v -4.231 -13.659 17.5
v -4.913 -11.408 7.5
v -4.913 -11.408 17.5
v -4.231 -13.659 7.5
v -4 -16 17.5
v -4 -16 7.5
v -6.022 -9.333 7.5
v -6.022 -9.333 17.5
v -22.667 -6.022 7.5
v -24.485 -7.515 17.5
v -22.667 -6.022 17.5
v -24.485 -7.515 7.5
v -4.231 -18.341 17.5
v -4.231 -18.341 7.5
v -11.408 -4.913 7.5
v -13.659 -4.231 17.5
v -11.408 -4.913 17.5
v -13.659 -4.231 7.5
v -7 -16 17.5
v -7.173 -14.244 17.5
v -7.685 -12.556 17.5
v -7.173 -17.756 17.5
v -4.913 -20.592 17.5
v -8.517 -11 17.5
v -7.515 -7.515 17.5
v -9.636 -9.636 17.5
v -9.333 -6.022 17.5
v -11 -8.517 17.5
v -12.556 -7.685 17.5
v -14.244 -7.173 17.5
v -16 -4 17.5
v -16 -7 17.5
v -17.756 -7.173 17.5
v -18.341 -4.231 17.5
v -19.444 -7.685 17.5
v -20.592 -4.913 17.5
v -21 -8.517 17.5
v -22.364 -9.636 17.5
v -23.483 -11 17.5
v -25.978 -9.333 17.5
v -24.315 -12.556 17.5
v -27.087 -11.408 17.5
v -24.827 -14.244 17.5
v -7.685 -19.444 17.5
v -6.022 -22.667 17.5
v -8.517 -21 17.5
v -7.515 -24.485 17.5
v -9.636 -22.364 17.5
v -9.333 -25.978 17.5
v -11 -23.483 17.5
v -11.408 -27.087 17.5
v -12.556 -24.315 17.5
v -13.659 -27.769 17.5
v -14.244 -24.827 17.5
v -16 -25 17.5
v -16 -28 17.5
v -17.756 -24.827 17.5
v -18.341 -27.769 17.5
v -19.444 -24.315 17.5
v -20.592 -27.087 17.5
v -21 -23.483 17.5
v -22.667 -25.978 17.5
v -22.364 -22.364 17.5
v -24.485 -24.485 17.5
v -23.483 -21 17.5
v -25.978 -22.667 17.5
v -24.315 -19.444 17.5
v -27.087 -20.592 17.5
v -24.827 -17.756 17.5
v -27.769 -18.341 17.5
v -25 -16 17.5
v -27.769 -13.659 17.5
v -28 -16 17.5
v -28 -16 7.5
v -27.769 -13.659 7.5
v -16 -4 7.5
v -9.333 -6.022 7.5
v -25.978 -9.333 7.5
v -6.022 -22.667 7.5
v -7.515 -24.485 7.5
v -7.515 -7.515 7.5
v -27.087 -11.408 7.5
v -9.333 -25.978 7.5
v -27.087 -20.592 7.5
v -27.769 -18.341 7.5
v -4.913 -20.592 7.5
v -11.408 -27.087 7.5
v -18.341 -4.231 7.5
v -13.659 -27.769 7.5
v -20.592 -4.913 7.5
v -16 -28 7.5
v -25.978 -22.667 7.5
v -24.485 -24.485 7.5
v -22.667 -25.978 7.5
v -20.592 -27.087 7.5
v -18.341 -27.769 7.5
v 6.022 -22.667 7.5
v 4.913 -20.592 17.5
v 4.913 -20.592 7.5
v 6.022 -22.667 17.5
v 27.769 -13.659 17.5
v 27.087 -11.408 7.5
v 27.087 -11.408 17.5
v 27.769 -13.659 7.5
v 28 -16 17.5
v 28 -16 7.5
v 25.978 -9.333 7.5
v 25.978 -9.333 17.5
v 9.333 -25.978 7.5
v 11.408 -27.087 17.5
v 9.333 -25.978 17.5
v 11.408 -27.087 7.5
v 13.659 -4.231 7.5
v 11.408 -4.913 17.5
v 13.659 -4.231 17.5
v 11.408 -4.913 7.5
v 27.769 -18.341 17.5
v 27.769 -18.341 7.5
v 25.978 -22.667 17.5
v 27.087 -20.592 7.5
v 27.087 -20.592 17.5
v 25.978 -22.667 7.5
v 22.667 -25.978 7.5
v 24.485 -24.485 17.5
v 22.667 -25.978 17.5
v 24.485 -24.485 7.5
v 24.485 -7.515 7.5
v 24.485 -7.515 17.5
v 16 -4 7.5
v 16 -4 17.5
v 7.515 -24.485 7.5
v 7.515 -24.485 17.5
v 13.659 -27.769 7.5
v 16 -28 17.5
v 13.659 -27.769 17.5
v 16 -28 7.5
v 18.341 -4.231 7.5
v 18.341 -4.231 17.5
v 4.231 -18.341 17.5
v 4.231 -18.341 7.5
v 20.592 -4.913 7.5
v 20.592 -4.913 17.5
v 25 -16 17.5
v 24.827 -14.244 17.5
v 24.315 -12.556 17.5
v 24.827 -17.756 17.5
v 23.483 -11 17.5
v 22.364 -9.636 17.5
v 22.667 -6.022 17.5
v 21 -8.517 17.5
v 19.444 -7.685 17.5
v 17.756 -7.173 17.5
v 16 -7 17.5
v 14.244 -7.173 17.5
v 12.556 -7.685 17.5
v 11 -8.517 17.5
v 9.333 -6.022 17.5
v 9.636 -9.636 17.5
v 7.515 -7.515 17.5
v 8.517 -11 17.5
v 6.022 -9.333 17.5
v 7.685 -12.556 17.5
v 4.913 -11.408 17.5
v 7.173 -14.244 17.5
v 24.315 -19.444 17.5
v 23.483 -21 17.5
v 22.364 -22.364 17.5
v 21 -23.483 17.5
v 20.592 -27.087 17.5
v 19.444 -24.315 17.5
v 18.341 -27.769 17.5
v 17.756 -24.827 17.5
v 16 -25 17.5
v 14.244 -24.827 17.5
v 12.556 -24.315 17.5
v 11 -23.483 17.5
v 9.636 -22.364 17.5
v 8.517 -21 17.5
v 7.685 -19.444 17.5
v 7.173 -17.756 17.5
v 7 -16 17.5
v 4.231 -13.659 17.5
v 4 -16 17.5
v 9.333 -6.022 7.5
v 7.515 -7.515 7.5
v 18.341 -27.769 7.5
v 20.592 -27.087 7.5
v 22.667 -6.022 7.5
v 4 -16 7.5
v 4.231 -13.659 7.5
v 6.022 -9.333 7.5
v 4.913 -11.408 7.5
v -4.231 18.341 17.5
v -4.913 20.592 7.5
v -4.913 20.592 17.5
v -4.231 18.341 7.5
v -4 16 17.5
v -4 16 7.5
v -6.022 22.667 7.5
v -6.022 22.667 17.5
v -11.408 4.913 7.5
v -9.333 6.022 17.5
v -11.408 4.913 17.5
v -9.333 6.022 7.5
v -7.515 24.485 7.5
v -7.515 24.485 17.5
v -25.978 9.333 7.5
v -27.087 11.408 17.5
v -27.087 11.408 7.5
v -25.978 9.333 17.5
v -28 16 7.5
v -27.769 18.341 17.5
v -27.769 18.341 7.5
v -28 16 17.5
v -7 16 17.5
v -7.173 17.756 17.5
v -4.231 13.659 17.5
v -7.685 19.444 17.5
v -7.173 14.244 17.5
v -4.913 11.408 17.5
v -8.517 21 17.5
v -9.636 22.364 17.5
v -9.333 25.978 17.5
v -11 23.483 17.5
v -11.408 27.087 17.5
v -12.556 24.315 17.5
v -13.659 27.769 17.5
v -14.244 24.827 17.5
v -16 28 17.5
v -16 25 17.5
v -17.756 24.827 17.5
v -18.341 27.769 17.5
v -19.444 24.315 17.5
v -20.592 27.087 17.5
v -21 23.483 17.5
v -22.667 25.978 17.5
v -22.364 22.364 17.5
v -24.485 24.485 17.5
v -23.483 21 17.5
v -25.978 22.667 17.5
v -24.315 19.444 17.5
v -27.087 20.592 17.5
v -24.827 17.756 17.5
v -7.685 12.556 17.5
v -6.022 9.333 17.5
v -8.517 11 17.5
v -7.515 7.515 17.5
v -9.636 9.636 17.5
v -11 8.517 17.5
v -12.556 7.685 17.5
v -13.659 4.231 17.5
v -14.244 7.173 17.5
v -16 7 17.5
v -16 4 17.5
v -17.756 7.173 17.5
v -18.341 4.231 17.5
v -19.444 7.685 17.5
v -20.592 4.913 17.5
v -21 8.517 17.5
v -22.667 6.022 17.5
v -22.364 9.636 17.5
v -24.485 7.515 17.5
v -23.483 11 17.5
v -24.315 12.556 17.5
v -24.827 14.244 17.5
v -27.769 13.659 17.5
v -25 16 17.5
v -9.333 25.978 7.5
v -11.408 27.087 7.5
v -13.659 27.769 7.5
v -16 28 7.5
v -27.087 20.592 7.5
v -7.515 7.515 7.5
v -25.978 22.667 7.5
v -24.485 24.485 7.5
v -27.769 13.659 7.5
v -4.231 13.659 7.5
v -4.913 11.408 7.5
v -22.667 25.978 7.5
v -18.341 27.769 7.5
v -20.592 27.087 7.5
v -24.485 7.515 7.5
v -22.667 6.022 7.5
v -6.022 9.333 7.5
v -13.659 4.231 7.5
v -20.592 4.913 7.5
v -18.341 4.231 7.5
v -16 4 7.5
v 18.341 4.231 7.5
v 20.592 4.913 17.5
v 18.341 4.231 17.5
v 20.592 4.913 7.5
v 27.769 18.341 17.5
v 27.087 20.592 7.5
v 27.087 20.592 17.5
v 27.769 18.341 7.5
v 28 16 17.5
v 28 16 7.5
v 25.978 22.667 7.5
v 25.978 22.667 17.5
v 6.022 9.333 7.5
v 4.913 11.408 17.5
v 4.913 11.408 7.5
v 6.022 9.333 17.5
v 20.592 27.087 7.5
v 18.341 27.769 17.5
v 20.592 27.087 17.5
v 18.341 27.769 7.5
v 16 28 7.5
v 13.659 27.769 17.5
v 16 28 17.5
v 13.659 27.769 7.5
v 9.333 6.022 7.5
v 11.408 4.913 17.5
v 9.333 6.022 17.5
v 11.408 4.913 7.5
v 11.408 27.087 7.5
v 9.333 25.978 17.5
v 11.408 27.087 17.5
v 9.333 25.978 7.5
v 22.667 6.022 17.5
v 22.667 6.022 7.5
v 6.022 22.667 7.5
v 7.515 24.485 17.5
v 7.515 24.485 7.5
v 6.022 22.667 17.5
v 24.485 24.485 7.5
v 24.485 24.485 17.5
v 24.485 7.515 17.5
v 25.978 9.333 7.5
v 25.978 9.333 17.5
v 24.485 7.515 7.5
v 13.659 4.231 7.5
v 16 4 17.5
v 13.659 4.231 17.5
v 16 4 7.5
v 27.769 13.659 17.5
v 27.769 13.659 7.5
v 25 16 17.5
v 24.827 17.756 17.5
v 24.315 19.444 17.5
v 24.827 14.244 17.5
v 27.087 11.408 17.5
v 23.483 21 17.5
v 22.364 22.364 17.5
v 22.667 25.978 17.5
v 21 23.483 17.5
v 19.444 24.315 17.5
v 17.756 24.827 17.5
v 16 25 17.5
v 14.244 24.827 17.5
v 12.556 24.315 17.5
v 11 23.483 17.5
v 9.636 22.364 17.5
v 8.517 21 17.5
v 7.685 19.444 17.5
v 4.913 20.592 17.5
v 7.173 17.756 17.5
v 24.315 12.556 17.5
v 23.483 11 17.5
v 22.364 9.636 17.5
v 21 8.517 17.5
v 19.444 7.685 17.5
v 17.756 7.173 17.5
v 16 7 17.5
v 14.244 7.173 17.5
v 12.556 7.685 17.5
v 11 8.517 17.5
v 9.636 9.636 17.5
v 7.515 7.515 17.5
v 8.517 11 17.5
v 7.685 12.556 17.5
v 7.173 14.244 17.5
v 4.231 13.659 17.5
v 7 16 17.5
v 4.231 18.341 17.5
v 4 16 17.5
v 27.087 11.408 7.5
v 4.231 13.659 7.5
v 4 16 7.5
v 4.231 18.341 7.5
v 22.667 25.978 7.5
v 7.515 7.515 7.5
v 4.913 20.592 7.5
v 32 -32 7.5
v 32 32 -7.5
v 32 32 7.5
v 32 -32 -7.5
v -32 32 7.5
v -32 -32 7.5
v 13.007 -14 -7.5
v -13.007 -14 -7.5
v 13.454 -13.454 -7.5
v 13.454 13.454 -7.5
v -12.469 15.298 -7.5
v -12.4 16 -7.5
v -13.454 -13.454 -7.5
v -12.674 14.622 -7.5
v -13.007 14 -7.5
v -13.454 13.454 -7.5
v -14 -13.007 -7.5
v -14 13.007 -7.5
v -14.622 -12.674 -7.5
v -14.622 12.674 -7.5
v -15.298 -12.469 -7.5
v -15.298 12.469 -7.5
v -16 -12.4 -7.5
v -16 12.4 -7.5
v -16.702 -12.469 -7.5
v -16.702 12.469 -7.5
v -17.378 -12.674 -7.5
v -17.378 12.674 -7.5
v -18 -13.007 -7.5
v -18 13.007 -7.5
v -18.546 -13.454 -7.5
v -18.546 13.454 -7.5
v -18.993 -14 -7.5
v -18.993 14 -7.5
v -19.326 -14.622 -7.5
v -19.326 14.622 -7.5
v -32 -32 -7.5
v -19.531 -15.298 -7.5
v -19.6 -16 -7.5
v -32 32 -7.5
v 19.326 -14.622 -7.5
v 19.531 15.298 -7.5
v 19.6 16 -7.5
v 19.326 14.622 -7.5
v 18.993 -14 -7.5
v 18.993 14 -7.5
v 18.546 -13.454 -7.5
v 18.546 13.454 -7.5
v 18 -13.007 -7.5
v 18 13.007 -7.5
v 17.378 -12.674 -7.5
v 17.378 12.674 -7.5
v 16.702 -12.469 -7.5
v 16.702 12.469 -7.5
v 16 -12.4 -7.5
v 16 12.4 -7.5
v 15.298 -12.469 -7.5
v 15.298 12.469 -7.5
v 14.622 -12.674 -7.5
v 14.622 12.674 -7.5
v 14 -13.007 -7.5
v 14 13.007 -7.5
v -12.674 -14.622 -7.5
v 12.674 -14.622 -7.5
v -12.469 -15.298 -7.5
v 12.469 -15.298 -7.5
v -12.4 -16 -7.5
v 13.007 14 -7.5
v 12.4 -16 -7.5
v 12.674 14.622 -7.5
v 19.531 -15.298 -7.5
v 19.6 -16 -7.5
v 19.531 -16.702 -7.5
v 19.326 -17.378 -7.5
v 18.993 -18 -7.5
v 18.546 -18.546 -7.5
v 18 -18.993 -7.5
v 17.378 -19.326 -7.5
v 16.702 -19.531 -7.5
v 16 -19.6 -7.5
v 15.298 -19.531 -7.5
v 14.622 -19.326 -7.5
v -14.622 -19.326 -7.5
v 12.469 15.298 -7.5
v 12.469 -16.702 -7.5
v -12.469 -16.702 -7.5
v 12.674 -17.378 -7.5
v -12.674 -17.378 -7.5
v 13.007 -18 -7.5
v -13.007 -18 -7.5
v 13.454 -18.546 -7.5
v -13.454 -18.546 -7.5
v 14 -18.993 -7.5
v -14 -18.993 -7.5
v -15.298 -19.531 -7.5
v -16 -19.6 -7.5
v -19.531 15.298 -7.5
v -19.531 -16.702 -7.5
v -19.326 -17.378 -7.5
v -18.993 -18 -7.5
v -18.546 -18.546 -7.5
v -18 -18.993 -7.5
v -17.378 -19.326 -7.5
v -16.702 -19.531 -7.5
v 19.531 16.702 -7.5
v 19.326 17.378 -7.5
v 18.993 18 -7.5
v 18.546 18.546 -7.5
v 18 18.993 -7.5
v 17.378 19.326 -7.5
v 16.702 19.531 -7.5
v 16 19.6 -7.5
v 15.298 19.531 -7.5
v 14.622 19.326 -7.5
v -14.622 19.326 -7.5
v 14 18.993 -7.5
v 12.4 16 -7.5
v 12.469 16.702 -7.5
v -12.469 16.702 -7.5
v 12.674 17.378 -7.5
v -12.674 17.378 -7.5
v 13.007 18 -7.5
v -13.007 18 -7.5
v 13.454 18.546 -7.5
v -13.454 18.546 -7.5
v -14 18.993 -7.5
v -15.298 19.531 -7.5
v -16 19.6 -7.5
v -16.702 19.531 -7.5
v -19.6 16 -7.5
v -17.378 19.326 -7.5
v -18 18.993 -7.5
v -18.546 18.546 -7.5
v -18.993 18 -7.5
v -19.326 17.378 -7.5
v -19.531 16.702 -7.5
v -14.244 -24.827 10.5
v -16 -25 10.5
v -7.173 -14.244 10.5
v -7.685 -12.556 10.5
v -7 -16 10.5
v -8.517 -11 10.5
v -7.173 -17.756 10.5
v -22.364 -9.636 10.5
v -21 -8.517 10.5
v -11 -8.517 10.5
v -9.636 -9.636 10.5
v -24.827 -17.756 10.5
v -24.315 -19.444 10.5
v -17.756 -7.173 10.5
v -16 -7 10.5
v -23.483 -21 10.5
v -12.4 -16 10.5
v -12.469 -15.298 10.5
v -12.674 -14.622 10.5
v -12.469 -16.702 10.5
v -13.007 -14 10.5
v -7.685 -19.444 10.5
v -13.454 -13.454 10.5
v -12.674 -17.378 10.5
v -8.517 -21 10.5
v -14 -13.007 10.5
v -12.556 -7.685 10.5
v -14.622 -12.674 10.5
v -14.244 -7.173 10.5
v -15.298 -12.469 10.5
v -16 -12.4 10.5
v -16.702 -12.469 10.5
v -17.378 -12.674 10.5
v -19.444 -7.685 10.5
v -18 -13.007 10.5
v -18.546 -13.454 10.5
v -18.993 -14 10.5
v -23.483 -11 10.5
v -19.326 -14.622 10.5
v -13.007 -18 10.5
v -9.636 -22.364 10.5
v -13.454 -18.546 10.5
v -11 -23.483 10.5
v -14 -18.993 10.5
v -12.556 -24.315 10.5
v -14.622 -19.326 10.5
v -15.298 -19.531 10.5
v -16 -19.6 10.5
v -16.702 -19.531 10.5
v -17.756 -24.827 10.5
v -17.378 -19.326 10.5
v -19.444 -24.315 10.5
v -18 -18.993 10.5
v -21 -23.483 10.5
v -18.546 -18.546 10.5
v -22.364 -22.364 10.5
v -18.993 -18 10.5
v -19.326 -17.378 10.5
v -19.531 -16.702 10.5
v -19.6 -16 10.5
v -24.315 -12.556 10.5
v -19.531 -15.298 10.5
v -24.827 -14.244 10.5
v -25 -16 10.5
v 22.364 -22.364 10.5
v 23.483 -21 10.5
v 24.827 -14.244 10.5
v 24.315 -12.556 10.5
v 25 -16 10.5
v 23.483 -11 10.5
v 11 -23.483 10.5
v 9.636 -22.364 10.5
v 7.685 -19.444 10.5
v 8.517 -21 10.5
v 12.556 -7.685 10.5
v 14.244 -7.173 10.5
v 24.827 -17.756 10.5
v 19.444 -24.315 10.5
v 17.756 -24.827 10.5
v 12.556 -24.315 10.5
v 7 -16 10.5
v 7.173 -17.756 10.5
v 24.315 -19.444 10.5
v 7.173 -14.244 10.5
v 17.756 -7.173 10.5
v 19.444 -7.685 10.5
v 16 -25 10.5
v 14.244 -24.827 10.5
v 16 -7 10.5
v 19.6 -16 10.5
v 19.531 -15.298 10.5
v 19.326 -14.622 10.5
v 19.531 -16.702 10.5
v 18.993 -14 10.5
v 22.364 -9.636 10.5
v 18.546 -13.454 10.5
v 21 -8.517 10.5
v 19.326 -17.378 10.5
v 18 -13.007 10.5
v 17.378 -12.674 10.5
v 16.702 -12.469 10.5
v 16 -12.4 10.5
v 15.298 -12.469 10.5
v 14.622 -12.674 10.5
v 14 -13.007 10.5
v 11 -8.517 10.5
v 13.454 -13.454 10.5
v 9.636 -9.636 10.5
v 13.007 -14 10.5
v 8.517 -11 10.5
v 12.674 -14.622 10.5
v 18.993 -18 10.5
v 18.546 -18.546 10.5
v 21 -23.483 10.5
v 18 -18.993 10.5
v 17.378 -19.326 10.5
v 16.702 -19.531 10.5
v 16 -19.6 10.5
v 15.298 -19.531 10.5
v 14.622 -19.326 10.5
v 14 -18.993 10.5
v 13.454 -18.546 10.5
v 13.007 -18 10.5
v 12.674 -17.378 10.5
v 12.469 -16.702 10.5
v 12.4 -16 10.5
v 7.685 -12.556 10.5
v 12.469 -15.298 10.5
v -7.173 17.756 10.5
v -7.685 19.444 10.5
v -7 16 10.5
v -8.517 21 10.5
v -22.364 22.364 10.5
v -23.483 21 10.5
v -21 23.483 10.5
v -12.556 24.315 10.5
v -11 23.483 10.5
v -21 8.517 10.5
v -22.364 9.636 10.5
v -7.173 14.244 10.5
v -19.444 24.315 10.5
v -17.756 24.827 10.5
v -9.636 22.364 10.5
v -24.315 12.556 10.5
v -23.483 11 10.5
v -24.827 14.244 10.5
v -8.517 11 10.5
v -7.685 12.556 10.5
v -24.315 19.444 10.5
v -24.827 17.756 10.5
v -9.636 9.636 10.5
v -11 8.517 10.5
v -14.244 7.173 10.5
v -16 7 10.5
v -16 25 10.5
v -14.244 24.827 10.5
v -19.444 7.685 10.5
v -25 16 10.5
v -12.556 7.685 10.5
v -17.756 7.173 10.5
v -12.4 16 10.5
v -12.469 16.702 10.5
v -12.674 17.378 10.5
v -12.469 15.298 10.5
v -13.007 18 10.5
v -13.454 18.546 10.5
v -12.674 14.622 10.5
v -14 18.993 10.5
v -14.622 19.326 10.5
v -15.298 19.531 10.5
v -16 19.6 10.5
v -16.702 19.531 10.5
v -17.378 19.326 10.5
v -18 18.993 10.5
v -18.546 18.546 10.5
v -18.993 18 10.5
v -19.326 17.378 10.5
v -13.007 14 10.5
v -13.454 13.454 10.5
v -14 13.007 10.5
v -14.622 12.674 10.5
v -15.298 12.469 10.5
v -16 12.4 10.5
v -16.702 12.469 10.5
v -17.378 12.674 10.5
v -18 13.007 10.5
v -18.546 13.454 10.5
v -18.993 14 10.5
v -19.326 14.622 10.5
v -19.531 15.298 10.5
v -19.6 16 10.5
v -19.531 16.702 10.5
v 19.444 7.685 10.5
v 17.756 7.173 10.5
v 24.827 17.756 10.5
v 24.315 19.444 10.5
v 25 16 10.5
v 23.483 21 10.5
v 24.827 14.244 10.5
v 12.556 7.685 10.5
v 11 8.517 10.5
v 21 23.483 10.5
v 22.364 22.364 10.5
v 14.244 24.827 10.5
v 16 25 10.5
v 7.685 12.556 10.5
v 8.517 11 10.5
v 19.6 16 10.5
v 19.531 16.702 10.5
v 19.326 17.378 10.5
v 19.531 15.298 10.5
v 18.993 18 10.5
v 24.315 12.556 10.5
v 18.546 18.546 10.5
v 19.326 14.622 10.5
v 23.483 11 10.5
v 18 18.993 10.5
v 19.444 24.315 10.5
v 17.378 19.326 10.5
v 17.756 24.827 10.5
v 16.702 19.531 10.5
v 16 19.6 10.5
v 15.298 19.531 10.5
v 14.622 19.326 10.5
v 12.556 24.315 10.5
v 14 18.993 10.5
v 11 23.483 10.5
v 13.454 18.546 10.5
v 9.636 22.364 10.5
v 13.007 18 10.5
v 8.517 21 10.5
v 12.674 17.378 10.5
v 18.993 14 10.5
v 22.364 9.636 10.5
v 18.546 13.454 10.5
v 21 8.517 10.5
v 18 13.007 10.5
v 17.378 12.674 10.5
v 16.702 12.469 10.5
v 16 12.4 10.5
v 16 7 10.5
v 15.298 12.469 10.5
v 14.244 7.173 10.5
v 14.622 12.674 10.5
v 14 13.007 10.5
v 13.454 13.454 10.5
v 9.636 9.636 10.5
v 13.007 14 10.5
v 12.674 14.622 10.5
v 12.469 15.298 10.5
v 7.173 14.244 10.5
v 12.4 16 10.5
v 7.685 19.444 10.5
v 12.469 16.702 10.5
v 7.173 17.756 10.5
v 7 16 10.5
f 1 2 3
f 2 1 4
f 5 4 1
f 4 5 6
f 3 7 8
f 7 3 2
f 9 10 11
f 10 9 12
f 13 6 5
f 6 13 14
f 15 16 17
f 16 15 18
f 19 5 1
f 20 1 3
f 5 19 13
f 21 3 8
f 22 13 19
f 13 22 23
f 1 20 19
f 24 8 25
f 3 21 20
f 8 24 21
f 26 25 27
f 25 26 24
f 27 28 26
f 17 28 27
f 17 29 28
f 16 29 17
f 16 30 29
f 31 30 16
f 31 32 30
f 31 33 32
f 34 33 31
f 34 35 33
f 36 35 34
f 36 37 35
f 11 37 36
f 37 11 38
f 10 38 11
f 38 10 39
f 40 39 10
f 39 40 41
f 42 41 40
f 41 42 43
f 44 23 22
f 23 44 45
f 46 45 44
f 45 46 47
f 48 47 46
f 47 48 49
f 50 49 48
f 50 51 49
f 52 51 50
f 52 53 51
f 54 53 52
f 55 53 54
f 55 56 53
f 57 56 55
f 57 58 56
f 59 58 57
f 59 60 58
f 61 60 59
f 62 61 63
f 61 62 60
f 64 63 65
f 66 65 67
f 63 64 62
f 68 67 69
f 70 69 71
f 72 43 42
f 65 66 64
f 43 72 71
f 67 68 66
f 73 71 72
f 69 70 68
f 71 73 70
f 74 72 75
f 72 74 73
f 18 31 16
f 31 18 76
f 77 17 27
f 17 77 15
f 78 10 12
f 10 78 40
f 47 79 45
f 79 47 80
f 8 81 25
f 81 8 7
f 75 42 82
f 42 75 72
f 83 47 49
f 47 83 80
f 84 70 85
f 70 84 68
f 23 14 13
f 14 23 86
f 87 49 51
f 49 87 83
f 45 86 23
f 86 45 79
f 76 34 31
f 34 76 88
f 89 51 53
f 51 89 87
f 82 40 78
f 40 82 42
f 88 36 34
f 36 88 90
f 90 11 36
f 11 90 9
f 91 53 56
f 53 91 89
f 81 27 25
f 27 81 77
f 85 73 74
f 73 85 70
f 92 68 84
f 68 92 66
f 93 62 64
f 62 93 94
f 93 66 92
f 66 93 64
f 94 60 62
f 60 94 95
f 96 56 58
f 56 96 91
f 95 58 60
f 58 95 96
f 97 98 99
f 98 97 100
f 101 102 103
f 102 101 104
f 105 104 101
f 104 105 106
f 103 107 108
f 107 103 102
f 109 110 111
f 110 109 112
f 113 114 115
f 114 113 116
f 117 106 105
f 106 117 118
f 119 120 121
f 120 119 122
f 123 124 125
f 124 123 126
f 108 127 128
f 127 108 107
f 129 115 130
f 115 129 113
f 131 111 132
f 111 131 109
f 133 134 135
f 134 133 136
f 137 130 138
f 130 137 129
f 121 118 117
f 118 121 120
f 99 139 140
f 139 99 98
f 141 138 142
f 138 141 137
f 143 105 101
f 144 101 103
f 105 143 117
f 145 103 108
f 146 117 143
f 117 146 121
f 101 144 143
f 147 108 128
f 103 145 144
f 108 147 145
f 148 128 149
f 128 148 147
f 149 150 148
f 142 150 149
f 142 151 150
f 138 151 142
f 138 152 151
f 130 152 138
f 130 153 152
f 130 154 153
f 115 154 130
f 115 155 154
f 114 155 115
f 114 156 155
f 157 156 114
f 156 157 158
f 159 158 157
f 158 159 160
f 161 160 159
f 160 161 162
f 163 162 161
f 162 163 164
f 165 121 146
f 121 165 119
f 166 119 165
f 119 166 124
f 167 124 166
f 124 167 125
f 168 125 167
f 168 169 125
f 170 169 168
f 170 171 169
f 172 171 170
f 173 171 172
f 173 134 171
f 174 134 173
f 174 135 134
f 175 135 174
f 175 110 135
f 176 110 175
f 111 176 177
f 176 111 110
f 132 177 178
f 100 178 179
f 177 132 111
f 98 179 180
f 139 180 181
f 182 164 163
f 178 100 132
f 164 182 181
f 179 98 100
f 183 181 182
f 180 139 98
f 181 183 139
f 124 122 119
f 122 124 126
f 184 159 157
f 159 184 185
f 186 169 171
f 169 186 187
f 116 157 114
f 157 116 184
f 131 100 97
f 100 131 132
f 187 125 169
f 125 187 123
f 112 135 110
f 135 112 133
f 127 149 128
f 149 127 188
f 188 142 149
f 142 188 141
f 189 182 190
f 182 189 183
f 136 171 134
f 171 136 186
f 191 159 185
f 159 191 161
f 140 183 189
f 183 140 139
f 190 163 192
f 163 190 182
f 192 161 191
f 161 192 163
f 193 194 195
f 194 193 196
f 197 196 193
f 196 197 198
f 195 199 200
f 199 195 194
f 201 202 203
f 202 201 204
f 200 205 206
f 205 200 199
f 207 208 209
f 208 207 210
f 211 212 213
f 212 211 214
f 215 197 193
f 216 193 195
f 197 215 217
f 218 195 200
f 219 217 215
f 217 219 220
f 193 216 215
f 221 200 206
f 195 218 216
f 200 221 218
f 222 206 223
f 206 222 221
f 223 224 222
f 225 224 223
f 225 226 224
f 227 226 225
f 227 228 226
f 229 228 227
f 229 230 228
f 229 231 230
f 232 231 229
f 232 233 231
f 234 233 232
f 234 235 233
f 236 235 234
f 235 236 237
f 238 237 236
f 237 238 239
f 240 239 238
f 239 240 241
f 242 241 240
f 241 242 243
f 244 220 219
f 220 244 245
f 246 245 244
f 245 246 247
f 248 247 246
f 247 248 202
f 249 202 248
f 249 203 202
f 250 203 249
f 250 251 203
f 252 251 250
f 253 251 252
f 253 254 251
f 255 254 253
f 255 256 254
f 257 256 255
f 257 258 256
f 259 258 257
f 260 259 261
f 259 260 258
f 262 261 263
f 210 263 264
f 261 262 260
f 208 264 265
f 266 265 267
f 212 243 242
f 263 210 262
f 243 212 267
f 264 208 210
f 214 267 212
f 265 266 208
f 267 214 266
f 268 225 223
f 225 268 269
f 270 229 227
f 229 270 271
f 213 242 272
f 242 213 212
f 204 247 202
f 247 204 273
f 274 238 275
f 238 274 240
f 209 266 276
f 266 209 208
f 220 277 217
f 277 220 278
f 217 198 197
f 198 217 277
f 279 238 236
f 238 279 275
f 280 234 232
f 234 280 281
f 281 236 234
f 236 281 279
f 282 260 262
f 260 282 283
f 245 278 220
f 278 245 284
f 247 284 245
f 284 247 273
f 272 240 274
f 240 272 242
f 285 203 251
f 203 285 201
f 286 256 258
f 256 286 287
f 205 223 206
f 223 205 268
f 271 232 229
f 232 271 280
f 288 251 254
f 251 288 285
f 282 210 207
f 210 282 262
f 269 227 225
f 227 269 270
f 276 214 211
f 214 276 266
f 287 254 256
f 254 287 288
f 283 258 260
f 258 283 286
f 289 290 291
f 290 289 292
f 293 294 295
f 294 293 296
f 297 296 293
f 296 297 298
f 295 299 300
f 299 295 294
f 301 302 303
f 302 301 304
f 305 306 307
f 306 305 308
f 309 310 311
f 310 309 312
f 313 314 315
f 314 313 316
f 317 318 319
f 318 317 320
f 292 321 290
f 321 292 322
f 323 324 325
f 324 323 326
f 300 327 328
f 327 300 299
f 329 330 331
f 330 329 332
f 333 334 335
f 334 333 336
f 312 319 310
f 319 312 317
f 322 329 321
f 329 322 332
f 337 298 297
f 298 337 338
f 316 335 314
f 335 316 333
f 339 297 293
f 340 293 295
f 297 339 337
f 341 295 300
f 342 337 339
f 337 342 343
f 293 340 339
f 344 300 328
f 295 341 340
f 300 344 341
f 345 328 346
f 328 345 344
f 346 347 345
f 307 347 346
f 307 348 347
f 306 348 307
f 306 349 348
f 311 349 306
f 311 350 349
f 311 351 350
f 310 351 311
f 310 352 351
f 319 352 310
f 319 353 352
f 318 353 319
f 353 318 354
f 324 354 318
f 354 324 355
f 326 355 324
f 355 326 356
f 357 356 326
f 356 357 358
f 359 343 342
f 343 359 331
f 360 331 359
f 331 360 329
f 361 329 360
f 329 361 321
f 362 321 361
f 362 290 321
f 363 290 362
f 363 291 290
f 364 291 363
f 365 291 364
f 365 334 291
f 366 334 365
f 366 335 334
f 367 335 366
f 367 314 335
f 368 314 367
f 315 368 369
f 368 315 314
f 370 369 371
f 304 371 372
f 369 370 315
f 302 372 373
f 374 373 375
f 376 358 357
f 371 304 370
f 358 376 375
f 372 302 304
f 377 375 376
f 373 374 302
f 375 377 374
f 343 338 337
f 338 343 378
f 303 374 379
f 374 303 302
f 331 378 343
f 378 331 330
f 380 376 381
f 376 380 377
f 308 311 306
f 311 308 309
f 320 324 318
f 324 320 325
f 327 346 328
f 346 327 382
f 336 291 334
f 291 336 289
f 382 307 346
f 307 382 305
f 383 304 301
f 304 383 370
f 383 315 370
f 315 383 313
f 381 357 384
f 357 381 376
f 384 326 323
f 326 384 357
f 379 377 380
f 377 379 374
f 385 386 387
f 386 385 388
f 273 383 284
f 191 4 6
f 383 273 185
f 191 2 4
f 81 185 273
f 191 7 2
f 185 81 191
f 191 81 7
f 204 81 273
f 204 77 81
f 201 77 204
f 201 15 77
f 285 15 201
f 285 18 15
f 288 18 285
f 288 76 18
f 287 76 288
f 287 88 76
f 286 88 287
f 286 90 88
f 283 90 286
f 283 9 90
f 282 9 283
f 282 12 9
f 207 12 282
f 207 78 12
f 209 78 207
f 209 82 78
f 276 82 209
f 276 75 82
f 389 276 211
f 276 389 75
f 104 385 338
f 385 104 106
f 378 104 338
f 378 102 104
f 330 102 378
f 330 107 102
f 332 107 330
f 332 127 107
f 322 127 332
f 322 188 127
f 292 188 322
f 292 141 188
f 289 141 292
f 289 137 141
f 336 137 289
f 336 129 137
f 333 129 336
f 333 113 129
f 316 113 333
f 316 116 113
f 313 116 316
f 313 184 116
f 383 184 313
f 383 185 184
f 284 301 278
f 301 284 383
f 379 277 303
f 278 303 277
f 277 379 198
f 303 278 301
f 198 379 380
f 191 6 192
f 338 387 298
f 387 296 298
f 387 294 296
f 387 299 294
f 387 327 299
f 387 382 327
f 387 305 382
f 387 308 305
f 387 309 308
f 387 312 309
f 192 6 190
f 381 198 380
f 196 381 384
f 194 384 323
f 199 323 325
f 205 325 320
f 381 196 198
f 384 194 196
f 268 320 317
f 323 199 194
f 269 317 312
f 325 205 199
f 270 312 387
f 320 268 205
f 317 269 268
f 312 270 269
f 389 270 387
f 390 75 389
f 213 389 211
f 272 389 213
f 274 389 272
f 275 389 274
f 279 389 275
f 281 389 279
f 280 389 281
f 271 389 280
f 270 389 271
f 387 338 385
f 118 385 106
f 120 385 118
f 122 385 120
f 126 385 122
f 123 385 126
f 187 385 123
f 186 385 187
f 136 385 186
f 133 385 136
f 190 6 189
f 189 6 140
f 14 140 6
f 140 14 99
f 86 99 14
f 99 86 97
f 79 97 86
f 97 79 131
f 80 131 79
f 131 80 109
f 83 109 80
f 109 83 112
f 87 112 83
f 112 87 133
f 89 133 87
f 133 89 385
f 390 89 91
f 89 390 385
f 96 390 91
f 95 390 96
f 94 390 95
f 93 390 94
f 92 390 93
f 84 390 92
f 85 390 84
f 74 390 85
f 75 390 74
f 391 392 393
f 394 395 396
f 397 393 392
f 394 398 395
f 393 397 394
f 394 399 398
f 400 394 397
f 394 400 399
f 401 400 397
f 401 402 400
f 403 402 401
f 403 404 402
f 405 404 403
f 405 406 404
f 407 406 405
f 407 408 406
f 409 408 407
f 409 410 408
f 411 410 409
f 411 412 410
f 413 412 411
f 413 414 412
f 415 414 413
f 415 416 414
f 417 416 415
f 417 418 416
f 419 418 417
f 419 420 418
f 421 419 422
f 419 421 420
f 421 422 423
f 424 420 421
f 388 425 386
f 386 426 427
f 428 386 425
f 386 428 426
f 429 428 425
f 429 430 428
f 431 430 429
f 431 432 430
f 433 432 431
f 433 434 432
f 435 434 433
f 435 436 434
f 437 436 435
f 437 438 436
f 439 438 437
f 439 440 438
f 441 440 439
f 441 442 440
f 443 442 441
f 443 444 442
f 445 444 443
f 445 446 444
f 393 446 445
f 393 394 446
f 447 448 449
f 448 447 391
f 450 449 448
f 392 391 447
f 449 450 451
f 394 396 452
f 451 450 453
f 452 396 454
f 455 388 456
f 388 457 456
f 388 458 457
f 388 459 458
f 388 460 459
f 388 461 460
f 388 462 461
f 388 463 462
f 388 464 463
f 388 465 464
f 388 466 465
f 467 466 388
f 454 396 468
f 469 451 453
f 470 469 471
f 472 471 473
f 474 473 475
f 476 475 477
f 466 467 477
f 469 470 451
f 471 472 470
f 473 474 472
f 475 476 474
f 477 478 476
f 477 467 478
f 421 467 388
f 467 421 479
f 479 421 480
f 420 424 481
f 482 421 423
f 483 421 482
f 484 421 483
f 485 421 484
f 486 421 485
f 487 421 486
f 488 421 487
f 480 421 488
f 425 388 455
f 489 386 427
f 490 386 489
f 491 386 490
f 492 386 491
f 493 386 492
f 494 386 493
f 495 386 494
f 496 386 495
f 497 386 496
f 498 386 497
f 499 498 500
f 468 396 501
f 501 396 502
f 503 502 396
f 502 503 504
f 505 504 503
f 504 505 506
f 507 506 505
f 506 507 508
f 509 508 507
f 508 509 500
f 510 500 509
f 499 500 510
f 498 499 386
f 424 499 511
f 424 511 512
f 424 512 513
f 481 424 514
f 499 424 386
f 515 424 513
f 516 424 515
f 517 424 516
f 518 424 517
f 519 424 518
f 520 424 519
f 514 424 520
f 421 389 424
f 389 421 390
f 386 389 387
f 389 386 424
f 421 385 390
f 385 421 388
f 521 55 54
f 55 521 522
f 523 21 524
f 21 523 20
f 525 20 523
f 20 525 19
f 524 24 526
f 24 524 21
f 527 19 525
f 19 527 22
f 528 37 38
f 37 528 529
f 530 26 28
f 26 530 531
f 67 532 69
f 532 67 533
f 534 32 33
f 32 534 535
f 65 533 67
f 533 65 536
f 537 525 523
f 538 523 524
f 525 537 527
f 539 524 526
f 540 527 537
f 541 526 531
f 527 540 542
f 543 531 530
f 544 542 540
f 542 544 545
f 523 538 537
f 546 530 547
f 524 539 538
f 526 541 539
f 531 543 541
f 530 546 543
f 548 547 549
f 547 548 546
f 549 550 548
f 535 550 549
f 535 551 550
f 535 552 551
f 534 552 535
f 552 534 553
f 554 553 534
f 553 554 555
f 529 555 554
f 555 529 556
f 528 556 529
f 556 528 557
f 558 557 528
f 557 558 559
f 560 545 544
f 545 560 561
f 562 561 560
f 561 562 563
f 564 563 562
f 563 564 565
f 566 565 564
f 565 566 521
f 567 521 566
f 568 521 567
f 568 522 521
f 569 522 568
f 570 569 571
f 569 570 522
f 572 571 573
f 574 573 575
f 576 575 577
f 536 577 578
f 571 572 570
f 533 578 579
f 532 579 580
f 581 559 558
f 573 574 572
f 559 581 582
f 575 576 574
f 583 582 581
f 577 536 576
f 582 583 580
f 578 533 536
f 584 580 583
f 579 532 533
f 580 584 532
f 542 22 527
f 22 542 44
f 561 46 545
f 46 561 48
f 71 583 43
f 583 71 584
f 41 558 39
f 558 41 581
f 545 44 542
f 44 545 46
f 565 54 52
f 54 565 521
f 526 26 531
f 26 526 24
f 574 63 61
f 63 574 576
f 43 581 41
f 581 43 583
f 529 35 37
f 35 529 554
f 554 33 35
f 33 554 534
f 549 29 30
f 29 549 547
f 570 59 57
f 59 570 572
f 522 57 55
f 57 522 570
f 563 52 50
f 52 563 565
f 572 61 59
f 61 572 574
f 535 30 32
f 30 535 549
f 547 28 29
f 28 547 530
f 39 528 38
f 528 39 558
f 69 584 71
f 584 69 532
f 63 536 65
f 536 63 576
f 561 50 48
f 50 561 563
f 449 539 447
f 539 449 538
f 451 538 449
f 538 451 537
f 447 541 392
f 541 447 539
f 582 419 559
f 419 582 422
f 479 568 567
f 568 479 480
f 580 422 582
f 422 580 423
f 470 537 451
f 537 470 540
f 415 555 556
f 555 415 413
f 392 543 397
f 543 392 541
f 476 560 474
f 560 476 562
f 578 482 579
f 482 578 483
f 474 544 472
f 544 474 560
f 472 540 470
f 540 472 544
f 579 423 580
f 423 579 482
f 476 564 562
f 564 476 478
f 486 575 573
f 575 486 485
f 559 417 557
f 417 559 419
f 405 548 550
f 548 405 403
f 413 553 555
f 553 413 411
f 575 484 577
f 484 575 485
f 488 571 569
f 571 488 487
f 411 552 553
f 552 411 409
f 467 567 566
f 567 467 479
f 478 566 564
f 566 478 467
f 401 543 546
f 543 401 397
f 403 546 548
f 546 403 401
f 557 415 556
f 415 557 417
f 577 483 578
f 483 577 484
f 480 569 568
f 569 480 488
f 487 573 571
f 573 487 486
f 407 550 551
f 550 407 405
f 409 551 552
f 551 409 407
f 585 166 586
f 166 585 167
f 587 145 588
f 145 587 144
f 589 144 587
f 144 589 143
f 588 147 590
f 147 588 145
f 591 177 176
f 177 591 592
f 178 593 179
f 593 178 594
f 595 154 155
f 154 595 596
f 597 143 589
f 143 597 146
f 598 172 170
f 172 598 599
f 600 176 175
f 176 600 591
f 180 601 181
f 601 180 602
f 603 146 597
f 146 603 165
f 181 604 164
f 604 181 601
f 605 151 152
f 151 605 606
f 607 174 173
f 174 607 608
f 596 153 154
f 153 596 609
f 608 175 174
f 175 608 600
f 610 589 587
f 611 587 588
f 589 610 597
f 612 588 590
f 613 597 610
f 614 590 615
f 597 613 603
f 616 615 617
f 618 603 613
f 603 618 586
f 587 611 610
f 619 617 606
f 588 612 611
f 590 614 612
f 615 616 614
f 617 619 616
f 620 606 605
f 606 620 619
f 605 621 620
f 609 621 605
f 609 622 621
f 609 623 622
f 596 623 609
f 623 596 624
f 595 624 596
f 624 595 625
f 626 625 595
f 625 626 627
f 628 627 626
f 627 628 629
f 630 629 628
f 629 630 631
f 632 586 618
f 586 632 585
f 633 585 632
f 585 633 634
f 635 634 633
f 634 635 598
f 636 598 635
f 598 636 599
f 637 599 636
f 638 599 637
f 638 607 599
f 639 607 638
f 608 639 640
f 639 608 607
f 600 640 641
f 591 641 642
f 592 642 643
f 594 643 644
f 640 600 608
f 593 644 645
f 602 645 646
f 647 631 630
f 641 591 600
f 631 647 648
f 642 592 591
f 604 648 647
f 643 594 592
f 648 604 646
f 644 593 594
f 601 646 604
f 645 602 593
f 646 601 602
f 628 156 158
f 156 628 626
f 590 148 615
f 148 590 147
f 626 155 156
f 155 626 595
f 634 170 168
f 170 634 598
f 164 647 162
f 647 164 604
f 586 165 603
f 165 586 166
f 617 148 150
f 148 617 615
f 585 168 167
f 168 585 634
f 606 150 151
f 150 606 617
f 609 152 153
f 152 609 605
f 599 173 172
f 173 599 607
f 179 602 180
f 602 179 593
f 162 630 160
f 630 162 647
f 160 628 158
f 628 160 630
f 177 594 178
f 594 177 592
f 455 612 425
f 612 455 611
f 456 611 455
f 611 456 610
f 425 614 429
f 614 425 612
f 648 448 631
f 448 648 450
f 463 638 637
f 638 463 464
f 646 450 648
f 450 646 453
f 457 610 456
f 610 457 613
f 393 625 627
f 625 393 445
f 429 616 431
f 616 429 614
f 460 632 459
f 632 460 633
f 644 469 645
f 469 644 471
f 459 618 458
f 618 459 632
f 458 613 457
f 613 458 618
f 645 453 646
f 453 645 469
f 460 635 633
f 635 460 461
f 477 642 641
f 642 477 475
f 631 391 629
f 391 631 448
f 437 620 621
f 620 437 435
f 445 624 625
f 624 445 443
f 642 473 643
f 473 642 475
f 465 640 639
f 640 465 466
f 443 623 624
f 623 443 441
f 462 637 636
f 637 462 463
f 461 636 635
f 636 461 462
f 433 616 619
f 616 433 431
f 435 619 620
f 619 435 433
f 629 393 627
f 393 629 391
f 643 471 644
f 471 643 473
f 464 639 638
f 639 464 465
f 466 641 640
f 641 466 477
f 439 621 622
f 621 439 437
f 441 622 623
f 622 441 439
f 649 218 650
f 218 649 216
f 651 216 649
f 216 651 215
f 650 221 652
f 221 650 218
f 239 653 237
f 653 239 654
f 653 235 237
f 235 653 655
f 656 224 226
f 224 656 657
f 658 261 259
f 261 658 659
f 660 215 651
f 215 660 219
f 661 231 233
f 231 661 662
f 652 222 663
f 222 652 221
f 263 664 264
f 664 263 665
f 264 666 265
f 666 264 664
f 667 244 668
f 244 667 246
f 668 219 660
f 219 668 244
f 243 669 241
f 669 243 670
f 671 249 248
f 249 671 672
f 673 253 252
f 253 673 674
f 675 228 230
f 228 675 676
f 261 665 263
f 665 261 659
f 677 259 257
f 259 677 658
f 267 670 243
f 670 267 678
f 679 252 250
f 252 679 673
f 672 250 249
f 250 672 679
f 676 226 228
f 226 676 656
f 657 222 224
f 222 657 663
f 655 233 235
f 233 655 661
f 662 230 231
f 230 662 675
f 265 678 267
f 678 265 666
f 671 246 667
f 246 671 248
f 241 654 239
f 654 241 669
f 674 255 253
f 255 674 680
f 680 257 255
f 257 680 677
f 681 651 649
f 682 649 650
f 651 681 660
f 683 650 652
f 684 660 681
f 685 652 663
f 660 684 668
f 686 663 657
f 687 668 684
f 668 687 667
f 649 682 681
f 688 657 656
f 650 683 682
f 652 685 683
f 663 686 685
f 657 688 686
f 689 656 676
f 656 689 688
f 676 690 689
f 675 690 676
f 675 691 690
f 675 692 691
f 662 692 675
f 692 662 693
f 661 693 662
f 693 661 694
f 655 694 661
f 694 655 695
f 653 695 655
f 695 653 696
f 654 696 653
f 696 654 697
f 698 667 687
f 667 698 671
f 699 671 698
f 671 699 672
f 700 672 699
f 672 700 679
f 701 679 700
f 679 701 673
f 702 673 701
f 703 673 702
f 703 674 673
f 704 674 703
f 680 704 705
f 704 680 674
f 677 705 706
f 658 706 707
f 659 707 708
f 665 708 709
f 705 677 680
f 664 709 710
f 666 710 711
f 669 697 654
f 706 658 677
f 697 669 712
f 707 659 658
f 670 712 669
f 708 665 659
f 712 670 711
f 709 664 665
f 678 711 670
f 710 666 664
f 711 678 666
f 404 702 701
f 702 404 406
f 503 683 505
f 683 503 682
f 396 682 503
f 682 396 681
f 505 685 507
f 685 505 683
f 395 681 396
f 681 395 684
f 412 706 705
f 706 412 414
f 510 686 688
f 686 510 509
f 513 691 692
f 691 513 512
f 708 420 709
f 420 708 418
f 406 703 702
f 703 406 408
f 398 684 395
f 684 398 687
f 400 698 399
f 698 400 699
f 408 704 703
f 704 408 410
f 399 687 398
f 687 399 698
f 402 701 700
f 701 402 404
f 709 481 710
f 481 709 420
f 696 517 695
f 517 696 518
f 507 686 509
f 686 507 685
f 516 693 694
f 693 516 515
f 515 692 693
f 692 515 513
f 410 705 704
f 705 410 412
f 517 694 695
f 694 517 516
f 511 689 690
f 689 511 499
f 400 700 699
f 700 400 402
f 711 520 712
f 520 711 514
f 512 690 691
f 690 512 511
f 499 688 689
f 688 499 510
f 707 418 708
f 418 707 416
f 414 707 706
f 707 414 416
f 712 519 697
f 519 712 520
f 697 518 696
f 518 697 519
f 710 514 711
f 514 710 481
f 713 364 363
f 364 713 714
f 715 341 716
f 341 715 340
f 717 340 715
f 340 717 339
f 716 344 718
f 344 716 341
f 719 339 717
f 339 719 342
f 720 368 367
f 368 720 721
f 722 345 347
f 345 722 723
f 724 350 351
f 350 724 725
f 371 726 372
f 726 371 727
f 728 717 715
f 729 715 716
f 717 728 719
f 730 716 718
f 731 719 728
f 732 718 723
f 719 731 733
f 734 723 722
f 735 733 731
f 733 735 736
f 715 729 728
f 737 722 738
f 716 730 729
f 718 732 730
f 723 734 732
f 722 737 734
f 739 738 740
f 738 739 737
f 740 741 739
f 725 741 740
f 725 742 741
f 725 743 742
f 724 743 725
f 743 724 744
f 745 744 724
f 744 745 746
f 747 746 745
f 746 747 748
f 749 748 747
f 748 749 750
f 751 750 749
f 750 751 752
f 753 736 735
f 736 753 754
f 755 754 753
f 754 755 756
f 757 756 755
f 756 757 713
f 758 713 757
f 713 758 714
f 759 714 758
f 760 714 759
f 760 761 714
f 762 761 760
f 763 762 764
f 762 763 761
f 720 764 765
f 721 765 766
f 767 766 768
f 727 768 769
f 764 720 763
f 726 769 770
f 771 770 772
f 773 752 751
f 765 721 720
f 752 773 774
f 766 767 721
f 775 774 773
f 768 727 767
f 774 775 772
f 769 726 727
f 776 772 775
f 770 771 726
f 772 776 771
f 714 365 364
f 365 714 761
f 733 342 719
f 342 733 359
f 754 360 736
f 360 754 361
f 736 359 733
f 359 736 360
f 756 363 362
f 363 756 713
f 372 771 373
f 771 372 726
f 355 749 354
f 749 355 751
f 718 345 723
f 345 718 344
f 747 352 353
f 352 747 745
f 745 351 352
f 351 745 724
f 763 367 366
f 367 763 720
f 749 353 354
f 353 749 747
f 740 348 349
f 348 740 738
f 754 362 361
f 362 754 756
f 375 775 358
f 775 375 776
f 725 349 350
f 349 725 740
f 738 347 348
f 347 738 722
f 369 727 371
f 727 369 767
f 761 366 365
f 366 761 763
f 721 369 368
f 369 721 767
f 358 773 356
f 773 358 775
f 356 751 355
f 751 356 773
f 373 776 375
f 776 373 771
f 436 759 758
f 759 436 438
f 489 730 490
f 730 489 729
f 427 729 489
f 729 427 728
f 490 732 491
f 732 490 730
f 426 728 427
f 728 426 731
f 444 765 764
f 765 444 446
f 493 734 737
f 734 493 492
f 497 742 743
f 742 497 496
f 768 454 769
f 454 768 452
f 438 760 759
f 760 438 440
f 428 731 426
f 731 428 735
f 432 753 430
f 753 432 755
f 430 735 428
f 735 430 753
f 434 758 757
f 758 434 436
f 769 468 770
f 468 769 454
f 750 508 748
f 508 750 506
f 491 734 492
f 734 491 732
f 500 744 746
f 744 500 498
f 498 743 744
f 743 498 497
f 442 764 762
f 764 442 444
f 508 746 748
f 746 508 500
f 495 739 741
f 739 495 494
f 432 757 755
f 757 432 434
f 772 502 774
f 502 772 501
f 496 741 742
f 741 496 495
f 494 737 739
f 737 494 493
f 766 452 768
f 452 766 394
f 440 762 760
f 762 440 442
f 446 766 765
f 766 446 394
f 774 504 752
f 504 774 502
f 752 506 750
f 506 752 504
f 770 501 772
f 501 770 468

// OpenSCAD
$fn = 32;

// ----------------------------------------------------------------------
// Socket pad plate
// bosses with counterbored sockets for the screws
// ----------------------------------------------------------------------

// --- parameters (mm) ---
base_t = 15;       // base plate thickness
boss_h = 10;       // boss height above the base plate
boss_d = 24;       // boss diameter
socket_d = 18;     // socket diameter
socket_depth = 7;  // socket depth from the boss face
bolt_d = 7.2;      // screw clearance hole through the socket floor
rows = 2;          // boss rows
cols = 2;          // bosses per row
pitch = 32;        // boss pitch

// --- derived feature positions (mm) ---
height = base_t + boss_h;           // = 25   overall height of the part
plate = [pitch * (cols - 1) + boss_d + 8, pitch * (rows - 1) + boss_d + 8, base_t];  // = [64, 64, 15]   overall size (x, y, z)
span_x = pitch * (cols - 1);        // = 32   distance between outer bosses
span_y = pitch * (rows - 1);        // = 32   distance between boss rows
origin_x = -span_x / 2;             // = -16   X of the first boss
origin_y = -span_y / 2;             // = -16   Y of the first boss
feature_centers = [
  [origin_x + 0 * pitch, origin_y + 0 * pitch],
  [origin_x + 1 * pitch, origin_y + 0 * pitch],
  [origin_x + 0 * pitch, origin_y + 1 * pitch],
  [origin_x + 1 * pitch, origin_y + 1 * pitch]
];   // boss centres: sockets, holes and the pads themselves are placed from here

// base plate, bosses on feature_centers, socket + through hole in each
difference() {
  union() {
    cube(plate, center = true);
    for (centre = feature_centers)
      translate([centre[0], centre[1], plate[2] / 2 - 1])
        cylinder(d = boss_d, h = boss_h + 1);
  }
  for (centre = feature_centers) {
    translate([centre[0], centre[1], plate[2] / 2 + boss_h - socket_depth])
      cylinder(d = socket_d, h = socket_depth + 1);
    translate([centre[0], centre[1], -height])
      cylinder(d = bolt_d, h = 2 * height + 2);  // through the socket floor
  }
}
